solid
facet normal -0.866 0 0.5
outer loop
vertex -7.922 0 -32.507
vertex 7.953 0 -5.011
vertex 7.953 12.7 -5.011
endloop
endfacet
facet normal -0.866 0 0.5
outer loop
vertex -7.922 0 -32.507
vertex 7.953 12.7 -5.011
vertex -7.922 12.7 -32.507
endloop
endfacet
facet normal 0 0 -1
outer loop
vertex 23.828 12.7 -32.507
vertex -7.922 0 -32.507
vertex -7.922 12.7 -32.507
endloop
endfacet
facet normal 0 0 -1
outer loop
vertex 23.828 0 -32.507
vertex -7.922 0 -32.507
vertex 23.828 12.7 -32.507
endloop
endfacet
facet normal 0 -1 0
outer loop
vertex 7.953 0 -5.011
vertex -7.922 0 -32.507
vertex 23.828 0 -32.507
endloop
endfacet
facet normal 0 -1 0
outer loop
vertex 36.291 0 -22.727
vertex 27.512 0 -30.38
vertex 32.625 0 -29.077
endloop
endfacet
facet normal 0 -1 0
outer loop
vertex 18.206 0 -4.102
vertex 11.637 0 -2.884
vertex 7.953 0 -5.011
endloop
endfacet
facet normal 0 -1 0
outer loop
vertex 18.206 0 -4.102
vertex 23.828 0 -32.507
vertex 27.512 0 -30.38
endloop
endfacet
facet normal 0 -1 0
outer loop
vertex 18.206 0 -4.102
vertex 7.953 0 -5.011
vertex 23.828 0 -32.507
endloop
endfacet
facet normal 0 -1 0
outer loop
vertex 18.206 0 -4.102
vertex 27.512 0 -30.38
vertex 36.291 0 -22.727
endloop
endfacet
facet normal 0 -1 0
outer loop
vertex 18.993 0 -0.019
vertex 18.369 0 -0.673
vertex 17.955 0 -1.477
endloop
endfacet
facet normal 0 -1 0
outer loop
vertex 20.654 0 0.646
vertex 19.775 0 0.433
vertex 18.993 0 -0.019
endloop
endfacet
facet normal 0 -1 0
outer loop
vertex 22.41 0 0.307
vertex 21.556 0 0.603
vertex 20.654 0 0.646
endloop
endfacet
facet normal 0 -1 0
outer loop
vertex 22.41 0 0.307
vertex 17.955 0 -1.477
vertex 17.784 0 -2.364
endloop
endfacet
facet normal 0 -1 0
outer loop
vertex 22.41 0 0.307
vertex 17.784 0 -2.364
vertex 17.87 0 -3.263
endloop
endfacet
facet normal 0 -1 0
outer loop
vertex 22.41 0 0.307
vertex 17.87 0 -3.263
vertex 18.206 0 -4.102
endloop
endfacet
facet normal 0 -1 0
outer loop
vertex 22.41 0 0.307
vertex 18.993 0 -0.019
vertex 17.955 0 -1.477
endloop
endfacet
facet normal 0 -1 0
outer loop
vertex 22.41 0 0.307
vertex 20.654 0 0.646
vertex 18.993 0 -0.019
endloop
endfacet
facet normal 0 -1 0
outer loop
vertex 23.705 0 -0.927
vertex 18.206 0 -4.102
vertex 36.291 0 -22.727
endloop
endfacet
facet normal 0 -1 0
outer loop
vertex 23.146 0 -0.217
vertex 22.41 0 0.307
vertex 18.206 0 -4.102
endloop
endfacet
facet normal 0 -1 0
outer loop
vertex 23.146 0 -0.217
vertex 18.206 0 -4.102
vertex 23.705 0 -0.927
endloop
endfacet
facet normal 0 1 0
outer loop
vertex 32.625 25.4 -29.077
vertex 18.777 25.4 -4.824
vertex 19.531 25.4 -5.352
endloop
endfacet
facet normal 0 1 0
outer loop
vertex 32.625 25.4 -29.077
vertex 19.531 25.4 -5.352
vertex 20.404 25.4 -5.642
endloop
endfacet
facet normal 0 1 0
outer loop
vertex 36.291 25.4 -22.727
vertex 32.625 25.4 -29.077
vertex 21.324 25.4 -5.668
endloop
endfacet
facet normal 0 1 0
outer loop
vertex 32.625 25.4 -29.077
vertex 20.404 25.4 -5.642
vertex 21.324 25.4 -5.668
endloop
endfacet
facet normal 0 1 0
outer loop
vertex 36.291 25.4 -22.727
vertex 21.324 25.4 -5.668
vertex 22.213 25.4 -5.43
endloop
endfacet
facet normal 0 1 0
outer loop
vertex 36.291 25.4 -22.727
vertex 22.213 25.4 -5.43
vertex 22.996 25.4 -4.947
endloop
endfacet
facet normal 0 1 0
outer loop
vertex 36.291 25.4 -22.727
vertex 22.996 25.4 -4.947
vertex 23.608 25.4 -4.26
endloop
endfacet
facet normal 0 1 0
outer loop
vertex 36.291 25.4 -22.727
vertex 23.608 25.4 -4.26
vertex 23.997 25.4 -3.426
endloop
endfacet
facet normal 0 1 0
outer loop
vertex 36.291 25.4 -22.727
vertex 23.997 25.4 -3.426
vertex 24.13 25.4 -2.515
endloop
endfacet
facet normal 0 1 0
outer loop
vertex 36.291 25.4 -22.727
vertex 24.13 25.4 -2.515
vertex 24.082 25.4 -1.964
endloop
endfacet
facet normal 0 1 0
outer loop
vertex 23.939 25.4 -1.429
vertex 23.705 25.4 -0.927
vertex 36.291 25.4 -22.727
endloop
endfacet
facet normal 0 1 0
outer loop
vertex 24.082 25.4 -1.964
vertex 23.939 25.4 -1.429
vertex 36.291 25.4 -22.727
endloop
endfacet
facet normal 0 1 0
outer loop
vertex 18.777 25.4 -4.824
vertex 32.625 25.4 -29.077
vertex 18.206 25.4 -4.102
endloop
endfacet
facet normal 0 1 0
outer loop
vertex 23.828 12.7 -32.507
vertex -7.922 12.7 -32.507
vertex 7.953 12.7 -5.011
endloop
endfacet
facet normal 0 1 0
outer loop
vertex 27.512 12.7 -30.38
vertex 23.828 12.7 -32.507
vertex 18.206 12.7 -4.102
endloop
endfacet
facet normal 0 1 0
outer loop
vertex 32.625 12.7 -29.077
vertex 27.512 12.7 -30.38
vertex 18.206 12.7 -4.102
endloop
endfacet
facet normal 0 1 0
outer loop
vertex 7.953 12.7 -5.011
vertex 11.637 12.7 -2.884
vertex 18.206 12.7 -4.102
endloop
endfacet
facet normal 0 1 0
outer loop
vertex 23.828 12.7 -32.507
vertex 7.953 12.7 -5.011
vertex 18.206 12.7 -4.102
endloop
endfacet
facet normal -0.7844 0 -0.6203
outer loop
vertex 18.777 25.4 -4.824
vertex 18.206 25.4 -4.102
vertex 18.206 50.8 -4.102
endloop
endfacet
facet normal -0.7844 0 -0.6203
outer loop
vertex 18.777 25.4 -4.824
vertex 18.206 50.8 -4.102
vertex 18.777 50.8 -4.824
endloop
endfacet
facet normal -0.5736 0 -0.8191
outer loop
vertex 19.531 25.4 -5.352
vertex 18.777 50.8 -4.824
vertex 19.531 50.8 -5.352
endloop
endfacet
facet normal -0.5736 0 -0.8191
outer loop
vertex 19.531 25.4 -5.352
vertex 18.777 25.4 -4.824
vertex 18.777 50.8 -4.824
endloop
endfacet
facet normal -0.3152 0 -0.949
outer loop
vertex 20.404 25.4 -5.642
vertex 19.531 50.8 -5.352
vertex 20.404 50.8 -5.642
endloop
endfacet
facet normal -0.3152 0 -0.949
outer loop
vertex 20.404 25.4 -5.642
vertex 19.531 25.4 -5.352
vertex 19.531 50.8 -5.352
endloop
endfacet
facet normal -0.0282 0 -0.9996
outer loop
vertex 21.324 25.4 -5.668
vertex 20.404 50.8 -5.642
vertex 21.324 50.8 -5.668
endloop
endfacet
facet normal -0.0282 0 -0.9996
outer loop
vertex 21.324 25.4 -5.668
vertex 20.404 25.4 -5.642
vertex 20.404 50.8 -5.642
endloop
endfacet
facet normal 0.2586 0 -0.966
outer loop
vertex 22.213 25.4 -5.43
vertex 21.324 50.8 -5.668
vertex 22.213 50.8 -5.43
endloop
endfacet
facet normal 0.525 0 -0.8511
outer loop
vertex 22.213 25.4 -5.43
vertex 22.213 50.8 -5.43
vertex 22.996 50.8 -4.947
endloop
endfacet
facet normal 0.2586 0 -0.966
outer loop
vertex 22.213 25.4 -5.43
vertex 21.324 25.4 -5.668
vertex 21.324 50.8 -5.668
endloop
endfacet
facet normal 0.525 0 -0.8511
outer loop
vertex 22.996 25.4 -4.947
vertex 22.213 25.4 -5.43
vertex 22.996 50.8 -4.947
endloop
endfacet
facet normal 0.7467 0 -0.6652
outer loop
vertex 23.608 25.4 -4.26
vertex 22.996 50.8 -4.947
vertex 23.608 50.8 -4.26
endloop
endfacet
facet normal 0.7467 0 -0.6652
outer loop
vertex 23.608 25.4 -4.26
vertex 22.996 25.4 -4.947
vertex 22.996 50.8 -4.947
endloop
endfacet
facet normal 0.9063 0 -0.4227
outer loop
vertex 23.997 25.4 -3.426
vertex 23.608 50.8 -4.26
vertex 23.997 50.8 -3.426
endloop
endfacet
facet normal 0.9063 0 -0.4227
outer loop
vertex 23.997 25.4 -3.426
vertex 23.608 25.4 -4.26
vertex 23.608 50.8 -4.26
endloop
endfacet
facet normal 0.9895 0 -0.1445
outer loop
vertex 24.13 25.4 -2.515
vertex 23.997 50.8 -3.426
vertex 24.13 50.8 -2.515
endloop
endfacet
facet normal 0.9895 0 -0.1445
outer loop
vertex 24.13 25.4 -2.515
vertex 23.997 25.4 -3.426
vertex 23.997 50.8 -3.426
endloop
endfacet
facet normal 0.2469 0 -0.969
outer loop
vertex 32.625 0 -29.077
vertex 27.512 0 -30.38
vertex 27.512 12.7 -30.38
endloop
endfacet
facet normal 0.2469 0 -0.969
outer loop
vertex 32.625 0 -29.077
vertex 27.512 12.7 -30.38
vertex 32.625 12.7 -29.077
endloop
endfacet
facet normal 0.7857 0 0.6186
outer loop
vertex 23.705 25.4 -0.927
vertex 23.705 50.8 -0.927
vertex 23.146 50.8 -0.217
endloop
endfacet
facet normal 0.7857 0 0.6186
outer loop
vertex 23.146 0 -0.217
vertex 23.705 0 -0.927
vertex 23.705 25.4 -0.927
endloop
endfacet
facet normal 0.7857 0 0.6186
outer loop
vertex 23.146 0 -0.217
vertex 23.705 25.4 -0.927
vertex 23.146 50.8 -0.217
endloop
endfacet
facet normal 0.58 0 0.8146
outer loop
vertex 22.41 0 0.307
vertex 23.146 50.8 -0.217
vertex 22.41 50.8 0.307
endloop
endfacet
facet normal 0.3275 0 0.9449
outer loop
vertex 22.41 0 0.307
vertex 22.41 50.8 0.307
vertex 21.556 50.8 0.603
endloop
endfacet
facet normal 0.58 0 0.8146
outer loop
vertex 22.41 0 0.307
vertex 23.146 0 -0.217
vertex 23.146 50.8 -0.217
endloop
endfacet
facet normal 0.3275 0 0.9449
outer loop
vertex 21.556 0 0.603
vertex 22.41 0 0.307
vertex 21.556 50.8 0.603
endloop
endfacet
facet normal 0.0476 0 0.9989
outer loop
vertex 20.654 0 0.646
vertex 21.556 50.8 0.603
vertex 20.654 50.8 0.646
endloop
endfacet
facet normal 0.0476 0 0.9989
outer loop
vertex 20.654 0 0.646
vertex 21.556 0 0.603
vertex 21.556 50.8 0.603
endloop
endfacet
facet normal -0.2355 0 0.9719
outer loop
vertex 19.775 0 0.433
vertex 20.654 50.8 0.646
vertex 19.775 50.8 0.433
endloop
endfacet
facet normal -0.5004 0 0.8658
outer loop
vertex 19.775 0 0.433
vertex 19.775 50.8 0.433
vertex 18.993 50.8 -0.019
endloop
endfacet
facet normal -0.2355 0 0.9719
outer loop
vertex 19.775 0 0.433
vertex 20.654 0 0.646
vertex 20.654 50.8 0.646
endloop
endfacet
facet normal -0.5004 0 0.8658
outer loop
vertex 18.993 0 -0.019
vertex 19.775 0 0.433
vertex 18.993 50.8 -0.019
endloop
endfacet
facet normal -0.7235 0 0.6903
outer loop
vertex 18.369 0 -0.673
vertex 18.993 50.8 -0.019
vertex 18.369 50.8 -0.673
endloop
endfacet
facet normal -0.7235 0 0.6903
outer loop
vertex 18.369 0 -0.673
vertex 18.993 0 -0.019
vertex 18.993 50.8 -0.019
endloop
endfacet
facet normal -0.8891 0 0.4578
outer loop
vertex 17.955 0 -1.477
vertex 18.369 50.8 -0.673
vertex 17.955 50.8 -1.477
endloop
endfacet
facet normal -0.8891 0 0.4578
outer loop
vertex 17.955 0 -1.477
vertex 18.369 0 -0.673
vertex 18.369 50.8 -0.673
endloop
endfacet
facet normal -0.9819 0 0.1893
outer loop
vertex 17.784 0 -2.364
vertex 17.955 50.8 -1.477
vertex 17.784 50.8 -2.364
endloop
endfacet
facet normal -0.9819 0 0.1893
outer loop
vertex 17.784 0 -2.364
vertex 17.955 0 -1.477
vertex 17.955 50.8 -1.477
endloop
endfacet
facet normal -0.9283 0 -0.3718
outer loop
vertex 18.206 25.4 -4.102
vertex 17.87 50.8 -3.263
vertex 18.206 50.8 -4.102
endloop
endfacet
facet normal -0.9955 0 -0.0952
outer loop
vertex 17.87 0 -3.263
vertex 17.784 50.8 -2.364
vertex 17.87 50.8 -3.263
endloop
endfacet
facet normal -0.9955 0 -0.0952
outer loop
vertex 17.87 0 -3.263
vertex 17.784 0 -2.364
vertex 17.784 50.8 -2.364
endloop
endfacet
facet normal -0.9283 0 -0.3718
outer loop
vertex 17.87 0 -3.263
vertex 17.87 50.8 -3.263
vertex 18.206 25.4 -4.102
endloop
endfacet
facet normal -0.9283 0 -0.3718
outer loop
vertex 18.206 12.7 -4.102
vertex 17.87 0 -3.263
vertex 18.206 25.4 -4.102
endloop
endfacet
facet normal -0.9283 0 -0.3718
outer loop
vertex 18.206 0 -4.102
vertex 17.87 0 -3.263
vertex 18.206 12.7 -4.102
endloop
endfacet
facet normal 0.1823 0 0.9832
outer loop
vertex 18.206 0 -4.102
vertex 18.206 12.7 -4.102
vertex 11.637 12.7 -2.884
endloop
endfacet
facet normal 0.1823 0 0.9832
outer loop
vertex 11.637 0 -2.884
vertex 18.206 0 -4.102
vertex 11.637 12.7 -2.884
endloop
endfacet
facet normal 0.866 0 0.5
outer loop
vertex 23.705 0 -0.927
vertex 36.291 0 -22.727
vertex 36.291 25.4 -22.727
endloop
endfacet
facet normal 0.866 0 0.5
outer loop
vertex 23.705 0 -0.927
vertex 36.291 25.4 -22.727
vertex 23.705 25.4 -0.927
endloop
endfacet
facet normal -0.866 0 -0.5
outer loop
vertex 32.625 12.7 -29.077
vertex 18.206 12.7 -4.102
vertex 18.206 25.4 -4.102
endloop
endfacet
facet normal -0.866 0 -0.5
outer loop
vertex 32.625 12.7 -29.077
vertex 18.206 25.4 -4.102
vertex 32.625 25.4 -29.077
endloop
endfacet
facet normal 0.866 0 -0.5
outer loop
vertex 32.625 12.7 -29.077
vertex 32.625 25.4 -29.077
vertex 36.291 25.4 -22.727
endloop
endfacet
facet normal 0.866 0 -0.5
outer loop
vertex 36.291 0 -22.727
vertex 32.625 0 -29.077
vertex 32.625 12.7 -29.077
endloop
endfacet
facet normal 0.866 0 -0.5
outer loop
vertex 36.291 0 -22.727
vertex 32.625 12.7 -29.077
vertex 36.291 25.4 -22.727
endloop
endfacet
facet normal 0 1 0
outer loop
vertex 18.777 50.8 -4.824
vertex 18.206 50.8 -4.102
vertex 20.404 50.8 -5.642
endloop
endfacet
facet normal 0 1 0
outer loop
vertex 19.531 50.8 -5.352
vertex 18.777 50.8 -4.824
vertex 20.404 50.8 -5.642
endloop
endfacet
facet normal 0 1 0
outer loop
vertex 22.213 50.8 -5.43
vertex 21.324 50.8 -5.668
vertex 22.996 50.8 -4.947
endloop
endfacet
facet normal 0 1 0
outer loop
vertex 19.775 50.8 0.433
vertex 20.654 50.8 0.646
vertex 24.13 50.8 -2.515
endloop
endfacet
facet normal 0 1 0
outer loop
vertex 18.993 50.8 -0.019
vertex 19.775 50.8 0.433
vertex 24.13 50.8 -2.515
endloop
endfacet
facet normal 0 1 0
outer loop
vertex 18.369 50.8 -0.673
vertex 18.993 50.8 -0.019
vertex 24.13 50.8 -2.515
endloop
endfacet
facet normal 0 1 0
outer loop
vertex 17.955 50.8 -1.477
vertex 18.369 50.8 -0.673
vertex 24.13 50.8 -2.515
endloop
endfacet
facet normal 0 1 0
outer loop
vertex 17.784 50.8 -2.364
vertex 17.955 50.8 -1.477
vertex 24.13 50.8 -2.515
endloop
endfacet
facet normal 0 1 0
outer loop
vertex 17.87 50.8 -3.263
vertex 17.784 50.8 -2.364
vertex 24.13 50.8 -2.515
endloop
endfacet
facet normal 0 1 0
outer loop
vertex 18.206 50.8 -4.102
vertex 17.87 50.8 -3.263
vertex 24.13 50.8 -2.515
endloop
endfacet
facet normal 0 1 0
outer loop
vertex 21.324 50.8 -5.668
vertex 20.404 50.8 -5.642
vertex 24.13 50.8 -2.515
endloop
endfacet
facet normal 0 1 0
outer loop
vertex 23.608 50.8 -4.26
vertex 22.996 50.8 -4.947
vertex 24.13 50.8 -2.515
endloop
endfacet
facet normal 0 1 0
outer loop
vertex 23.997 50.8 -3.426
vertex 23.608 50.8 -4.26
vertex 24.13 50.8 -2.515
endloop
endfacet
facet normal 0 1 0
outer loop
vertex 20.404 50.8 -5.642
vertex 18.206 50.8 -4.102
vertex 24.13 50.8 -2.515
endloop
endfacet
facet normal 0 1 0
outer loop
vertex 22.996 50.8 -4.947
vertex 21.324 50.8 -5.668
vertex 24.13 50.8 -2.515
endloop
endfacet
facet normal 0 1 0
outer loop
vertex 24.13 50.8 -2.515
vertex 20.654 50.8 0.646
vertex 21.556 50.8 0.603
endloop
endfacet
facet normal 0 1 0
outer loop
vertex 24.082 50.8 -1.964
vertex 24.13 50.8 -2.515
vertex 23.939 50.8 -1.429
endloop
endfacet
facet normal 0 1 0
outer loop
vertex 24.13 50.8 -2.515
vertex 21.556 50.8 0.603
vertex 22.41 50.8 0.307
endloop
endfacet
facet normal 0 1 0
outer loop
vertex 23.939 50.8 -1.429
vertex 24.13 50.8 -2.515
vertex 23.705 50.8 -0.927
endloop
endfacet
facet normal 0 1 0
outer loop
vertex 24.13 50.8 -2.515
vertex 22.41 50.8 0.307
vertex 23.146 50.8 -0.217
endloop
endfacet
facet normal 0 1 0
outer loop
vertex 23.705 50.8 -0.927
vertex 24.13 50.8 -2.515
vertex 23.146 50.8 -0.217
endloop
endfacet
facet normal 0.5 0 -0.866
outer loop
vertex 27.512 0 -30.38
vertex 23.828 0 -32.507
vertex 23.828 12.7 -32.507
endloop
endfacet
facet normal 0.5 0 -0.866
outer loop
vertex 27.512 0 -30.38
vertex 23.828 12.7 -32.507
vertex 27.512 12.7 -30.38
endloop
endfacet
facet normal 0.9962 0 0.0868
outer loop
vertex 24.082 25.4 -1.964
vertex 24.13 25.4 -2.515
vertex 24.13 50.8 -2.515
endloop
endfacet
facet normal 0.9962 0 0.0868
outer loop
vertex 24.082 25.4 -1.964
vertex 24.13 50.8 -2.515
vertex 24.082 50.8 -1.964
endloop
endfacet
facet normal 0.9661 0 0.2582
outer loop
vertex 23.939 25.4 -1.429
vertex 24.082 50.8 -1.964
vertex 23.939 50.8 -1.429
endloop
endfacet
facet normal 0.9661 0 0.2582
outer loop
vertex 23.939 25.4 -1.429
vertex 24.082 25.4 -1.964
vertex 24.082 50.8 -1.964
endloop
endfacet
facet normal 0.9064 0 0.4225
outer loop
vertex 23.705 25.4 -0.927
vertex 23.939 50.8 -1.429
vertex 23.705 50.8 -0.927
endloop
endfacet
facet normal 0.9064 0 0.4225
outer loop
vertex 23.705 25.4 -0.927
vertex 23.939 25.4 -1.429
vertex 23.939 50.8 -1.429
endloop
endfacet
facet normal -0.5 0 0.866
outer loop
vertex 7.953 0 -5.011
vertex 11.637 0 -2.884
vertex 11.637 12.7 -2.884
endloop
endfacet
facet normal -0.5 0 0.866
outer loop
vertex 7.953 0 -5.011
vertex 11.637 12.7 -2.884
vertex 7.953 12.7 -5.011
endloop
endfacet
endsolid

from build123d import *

# Parameters (mm, degrees)
F1_DEPTH = 12.7
F2_DEPTH = 25.4
F3_DEPTH = 50.8


with BuildPart() as f1:
    # F0 (on Front) → F1 (new body)
    with BuildSketch(Plane.XZ):
        Polygon((23.827744, -32.507298), (27.511551, -30.380452), (11.636551, -2.884145), (7.952744, -5.010992), (-7.922256, -32.507298), align=None)
        Polygon((27.511551, -30.380452), (32.624925, -29.077077), (18.205816, -4.102446), (11.636551, -2.884145), align=None)
    extrude(amount=-F1_DEPTH)

    # F0 (on Front) → F2 (join)
    with BuildSketch(Plane.XZ):
        with BuildLine():
            Line((32.624925, -29.077077), (36.2911, -22.727077))
            Line((36.2911, -22.727077), (23.705077, -0.927446))
            ThreePointArc((23.705077, -0.927446), (24.022261, -1.693196), (24.130446, -2.514946))
            ThreePointArc((24.130446, -2.514946), (21.777197, -5.581761), (18.205816, -4.102446))
            Line((18.205816, -4.102446), (32.624925, -29.077077))
        make_face()
    extrude(amount=-F2_DEPTH)

    # F0 (on Front) → F3 (join)
    with BuildSketch(Plane.XZ):
        with BuildLine():
            ThreePointArc((24.130446, -2.514946), (24.022261, -1.693196), (23.705077, -0.927446))
            ThreePointArc((23.705077, -0.927446), (19.367946, 0.234685), (18.205816, -4.102446))
            ThreePointArc((18.205816, -4.102446), (21.777197, -5.581761), (24.130446, -2.514946))
        make_face()
    extrude(amount=-F3_DEPTH)


solid = f1.part
